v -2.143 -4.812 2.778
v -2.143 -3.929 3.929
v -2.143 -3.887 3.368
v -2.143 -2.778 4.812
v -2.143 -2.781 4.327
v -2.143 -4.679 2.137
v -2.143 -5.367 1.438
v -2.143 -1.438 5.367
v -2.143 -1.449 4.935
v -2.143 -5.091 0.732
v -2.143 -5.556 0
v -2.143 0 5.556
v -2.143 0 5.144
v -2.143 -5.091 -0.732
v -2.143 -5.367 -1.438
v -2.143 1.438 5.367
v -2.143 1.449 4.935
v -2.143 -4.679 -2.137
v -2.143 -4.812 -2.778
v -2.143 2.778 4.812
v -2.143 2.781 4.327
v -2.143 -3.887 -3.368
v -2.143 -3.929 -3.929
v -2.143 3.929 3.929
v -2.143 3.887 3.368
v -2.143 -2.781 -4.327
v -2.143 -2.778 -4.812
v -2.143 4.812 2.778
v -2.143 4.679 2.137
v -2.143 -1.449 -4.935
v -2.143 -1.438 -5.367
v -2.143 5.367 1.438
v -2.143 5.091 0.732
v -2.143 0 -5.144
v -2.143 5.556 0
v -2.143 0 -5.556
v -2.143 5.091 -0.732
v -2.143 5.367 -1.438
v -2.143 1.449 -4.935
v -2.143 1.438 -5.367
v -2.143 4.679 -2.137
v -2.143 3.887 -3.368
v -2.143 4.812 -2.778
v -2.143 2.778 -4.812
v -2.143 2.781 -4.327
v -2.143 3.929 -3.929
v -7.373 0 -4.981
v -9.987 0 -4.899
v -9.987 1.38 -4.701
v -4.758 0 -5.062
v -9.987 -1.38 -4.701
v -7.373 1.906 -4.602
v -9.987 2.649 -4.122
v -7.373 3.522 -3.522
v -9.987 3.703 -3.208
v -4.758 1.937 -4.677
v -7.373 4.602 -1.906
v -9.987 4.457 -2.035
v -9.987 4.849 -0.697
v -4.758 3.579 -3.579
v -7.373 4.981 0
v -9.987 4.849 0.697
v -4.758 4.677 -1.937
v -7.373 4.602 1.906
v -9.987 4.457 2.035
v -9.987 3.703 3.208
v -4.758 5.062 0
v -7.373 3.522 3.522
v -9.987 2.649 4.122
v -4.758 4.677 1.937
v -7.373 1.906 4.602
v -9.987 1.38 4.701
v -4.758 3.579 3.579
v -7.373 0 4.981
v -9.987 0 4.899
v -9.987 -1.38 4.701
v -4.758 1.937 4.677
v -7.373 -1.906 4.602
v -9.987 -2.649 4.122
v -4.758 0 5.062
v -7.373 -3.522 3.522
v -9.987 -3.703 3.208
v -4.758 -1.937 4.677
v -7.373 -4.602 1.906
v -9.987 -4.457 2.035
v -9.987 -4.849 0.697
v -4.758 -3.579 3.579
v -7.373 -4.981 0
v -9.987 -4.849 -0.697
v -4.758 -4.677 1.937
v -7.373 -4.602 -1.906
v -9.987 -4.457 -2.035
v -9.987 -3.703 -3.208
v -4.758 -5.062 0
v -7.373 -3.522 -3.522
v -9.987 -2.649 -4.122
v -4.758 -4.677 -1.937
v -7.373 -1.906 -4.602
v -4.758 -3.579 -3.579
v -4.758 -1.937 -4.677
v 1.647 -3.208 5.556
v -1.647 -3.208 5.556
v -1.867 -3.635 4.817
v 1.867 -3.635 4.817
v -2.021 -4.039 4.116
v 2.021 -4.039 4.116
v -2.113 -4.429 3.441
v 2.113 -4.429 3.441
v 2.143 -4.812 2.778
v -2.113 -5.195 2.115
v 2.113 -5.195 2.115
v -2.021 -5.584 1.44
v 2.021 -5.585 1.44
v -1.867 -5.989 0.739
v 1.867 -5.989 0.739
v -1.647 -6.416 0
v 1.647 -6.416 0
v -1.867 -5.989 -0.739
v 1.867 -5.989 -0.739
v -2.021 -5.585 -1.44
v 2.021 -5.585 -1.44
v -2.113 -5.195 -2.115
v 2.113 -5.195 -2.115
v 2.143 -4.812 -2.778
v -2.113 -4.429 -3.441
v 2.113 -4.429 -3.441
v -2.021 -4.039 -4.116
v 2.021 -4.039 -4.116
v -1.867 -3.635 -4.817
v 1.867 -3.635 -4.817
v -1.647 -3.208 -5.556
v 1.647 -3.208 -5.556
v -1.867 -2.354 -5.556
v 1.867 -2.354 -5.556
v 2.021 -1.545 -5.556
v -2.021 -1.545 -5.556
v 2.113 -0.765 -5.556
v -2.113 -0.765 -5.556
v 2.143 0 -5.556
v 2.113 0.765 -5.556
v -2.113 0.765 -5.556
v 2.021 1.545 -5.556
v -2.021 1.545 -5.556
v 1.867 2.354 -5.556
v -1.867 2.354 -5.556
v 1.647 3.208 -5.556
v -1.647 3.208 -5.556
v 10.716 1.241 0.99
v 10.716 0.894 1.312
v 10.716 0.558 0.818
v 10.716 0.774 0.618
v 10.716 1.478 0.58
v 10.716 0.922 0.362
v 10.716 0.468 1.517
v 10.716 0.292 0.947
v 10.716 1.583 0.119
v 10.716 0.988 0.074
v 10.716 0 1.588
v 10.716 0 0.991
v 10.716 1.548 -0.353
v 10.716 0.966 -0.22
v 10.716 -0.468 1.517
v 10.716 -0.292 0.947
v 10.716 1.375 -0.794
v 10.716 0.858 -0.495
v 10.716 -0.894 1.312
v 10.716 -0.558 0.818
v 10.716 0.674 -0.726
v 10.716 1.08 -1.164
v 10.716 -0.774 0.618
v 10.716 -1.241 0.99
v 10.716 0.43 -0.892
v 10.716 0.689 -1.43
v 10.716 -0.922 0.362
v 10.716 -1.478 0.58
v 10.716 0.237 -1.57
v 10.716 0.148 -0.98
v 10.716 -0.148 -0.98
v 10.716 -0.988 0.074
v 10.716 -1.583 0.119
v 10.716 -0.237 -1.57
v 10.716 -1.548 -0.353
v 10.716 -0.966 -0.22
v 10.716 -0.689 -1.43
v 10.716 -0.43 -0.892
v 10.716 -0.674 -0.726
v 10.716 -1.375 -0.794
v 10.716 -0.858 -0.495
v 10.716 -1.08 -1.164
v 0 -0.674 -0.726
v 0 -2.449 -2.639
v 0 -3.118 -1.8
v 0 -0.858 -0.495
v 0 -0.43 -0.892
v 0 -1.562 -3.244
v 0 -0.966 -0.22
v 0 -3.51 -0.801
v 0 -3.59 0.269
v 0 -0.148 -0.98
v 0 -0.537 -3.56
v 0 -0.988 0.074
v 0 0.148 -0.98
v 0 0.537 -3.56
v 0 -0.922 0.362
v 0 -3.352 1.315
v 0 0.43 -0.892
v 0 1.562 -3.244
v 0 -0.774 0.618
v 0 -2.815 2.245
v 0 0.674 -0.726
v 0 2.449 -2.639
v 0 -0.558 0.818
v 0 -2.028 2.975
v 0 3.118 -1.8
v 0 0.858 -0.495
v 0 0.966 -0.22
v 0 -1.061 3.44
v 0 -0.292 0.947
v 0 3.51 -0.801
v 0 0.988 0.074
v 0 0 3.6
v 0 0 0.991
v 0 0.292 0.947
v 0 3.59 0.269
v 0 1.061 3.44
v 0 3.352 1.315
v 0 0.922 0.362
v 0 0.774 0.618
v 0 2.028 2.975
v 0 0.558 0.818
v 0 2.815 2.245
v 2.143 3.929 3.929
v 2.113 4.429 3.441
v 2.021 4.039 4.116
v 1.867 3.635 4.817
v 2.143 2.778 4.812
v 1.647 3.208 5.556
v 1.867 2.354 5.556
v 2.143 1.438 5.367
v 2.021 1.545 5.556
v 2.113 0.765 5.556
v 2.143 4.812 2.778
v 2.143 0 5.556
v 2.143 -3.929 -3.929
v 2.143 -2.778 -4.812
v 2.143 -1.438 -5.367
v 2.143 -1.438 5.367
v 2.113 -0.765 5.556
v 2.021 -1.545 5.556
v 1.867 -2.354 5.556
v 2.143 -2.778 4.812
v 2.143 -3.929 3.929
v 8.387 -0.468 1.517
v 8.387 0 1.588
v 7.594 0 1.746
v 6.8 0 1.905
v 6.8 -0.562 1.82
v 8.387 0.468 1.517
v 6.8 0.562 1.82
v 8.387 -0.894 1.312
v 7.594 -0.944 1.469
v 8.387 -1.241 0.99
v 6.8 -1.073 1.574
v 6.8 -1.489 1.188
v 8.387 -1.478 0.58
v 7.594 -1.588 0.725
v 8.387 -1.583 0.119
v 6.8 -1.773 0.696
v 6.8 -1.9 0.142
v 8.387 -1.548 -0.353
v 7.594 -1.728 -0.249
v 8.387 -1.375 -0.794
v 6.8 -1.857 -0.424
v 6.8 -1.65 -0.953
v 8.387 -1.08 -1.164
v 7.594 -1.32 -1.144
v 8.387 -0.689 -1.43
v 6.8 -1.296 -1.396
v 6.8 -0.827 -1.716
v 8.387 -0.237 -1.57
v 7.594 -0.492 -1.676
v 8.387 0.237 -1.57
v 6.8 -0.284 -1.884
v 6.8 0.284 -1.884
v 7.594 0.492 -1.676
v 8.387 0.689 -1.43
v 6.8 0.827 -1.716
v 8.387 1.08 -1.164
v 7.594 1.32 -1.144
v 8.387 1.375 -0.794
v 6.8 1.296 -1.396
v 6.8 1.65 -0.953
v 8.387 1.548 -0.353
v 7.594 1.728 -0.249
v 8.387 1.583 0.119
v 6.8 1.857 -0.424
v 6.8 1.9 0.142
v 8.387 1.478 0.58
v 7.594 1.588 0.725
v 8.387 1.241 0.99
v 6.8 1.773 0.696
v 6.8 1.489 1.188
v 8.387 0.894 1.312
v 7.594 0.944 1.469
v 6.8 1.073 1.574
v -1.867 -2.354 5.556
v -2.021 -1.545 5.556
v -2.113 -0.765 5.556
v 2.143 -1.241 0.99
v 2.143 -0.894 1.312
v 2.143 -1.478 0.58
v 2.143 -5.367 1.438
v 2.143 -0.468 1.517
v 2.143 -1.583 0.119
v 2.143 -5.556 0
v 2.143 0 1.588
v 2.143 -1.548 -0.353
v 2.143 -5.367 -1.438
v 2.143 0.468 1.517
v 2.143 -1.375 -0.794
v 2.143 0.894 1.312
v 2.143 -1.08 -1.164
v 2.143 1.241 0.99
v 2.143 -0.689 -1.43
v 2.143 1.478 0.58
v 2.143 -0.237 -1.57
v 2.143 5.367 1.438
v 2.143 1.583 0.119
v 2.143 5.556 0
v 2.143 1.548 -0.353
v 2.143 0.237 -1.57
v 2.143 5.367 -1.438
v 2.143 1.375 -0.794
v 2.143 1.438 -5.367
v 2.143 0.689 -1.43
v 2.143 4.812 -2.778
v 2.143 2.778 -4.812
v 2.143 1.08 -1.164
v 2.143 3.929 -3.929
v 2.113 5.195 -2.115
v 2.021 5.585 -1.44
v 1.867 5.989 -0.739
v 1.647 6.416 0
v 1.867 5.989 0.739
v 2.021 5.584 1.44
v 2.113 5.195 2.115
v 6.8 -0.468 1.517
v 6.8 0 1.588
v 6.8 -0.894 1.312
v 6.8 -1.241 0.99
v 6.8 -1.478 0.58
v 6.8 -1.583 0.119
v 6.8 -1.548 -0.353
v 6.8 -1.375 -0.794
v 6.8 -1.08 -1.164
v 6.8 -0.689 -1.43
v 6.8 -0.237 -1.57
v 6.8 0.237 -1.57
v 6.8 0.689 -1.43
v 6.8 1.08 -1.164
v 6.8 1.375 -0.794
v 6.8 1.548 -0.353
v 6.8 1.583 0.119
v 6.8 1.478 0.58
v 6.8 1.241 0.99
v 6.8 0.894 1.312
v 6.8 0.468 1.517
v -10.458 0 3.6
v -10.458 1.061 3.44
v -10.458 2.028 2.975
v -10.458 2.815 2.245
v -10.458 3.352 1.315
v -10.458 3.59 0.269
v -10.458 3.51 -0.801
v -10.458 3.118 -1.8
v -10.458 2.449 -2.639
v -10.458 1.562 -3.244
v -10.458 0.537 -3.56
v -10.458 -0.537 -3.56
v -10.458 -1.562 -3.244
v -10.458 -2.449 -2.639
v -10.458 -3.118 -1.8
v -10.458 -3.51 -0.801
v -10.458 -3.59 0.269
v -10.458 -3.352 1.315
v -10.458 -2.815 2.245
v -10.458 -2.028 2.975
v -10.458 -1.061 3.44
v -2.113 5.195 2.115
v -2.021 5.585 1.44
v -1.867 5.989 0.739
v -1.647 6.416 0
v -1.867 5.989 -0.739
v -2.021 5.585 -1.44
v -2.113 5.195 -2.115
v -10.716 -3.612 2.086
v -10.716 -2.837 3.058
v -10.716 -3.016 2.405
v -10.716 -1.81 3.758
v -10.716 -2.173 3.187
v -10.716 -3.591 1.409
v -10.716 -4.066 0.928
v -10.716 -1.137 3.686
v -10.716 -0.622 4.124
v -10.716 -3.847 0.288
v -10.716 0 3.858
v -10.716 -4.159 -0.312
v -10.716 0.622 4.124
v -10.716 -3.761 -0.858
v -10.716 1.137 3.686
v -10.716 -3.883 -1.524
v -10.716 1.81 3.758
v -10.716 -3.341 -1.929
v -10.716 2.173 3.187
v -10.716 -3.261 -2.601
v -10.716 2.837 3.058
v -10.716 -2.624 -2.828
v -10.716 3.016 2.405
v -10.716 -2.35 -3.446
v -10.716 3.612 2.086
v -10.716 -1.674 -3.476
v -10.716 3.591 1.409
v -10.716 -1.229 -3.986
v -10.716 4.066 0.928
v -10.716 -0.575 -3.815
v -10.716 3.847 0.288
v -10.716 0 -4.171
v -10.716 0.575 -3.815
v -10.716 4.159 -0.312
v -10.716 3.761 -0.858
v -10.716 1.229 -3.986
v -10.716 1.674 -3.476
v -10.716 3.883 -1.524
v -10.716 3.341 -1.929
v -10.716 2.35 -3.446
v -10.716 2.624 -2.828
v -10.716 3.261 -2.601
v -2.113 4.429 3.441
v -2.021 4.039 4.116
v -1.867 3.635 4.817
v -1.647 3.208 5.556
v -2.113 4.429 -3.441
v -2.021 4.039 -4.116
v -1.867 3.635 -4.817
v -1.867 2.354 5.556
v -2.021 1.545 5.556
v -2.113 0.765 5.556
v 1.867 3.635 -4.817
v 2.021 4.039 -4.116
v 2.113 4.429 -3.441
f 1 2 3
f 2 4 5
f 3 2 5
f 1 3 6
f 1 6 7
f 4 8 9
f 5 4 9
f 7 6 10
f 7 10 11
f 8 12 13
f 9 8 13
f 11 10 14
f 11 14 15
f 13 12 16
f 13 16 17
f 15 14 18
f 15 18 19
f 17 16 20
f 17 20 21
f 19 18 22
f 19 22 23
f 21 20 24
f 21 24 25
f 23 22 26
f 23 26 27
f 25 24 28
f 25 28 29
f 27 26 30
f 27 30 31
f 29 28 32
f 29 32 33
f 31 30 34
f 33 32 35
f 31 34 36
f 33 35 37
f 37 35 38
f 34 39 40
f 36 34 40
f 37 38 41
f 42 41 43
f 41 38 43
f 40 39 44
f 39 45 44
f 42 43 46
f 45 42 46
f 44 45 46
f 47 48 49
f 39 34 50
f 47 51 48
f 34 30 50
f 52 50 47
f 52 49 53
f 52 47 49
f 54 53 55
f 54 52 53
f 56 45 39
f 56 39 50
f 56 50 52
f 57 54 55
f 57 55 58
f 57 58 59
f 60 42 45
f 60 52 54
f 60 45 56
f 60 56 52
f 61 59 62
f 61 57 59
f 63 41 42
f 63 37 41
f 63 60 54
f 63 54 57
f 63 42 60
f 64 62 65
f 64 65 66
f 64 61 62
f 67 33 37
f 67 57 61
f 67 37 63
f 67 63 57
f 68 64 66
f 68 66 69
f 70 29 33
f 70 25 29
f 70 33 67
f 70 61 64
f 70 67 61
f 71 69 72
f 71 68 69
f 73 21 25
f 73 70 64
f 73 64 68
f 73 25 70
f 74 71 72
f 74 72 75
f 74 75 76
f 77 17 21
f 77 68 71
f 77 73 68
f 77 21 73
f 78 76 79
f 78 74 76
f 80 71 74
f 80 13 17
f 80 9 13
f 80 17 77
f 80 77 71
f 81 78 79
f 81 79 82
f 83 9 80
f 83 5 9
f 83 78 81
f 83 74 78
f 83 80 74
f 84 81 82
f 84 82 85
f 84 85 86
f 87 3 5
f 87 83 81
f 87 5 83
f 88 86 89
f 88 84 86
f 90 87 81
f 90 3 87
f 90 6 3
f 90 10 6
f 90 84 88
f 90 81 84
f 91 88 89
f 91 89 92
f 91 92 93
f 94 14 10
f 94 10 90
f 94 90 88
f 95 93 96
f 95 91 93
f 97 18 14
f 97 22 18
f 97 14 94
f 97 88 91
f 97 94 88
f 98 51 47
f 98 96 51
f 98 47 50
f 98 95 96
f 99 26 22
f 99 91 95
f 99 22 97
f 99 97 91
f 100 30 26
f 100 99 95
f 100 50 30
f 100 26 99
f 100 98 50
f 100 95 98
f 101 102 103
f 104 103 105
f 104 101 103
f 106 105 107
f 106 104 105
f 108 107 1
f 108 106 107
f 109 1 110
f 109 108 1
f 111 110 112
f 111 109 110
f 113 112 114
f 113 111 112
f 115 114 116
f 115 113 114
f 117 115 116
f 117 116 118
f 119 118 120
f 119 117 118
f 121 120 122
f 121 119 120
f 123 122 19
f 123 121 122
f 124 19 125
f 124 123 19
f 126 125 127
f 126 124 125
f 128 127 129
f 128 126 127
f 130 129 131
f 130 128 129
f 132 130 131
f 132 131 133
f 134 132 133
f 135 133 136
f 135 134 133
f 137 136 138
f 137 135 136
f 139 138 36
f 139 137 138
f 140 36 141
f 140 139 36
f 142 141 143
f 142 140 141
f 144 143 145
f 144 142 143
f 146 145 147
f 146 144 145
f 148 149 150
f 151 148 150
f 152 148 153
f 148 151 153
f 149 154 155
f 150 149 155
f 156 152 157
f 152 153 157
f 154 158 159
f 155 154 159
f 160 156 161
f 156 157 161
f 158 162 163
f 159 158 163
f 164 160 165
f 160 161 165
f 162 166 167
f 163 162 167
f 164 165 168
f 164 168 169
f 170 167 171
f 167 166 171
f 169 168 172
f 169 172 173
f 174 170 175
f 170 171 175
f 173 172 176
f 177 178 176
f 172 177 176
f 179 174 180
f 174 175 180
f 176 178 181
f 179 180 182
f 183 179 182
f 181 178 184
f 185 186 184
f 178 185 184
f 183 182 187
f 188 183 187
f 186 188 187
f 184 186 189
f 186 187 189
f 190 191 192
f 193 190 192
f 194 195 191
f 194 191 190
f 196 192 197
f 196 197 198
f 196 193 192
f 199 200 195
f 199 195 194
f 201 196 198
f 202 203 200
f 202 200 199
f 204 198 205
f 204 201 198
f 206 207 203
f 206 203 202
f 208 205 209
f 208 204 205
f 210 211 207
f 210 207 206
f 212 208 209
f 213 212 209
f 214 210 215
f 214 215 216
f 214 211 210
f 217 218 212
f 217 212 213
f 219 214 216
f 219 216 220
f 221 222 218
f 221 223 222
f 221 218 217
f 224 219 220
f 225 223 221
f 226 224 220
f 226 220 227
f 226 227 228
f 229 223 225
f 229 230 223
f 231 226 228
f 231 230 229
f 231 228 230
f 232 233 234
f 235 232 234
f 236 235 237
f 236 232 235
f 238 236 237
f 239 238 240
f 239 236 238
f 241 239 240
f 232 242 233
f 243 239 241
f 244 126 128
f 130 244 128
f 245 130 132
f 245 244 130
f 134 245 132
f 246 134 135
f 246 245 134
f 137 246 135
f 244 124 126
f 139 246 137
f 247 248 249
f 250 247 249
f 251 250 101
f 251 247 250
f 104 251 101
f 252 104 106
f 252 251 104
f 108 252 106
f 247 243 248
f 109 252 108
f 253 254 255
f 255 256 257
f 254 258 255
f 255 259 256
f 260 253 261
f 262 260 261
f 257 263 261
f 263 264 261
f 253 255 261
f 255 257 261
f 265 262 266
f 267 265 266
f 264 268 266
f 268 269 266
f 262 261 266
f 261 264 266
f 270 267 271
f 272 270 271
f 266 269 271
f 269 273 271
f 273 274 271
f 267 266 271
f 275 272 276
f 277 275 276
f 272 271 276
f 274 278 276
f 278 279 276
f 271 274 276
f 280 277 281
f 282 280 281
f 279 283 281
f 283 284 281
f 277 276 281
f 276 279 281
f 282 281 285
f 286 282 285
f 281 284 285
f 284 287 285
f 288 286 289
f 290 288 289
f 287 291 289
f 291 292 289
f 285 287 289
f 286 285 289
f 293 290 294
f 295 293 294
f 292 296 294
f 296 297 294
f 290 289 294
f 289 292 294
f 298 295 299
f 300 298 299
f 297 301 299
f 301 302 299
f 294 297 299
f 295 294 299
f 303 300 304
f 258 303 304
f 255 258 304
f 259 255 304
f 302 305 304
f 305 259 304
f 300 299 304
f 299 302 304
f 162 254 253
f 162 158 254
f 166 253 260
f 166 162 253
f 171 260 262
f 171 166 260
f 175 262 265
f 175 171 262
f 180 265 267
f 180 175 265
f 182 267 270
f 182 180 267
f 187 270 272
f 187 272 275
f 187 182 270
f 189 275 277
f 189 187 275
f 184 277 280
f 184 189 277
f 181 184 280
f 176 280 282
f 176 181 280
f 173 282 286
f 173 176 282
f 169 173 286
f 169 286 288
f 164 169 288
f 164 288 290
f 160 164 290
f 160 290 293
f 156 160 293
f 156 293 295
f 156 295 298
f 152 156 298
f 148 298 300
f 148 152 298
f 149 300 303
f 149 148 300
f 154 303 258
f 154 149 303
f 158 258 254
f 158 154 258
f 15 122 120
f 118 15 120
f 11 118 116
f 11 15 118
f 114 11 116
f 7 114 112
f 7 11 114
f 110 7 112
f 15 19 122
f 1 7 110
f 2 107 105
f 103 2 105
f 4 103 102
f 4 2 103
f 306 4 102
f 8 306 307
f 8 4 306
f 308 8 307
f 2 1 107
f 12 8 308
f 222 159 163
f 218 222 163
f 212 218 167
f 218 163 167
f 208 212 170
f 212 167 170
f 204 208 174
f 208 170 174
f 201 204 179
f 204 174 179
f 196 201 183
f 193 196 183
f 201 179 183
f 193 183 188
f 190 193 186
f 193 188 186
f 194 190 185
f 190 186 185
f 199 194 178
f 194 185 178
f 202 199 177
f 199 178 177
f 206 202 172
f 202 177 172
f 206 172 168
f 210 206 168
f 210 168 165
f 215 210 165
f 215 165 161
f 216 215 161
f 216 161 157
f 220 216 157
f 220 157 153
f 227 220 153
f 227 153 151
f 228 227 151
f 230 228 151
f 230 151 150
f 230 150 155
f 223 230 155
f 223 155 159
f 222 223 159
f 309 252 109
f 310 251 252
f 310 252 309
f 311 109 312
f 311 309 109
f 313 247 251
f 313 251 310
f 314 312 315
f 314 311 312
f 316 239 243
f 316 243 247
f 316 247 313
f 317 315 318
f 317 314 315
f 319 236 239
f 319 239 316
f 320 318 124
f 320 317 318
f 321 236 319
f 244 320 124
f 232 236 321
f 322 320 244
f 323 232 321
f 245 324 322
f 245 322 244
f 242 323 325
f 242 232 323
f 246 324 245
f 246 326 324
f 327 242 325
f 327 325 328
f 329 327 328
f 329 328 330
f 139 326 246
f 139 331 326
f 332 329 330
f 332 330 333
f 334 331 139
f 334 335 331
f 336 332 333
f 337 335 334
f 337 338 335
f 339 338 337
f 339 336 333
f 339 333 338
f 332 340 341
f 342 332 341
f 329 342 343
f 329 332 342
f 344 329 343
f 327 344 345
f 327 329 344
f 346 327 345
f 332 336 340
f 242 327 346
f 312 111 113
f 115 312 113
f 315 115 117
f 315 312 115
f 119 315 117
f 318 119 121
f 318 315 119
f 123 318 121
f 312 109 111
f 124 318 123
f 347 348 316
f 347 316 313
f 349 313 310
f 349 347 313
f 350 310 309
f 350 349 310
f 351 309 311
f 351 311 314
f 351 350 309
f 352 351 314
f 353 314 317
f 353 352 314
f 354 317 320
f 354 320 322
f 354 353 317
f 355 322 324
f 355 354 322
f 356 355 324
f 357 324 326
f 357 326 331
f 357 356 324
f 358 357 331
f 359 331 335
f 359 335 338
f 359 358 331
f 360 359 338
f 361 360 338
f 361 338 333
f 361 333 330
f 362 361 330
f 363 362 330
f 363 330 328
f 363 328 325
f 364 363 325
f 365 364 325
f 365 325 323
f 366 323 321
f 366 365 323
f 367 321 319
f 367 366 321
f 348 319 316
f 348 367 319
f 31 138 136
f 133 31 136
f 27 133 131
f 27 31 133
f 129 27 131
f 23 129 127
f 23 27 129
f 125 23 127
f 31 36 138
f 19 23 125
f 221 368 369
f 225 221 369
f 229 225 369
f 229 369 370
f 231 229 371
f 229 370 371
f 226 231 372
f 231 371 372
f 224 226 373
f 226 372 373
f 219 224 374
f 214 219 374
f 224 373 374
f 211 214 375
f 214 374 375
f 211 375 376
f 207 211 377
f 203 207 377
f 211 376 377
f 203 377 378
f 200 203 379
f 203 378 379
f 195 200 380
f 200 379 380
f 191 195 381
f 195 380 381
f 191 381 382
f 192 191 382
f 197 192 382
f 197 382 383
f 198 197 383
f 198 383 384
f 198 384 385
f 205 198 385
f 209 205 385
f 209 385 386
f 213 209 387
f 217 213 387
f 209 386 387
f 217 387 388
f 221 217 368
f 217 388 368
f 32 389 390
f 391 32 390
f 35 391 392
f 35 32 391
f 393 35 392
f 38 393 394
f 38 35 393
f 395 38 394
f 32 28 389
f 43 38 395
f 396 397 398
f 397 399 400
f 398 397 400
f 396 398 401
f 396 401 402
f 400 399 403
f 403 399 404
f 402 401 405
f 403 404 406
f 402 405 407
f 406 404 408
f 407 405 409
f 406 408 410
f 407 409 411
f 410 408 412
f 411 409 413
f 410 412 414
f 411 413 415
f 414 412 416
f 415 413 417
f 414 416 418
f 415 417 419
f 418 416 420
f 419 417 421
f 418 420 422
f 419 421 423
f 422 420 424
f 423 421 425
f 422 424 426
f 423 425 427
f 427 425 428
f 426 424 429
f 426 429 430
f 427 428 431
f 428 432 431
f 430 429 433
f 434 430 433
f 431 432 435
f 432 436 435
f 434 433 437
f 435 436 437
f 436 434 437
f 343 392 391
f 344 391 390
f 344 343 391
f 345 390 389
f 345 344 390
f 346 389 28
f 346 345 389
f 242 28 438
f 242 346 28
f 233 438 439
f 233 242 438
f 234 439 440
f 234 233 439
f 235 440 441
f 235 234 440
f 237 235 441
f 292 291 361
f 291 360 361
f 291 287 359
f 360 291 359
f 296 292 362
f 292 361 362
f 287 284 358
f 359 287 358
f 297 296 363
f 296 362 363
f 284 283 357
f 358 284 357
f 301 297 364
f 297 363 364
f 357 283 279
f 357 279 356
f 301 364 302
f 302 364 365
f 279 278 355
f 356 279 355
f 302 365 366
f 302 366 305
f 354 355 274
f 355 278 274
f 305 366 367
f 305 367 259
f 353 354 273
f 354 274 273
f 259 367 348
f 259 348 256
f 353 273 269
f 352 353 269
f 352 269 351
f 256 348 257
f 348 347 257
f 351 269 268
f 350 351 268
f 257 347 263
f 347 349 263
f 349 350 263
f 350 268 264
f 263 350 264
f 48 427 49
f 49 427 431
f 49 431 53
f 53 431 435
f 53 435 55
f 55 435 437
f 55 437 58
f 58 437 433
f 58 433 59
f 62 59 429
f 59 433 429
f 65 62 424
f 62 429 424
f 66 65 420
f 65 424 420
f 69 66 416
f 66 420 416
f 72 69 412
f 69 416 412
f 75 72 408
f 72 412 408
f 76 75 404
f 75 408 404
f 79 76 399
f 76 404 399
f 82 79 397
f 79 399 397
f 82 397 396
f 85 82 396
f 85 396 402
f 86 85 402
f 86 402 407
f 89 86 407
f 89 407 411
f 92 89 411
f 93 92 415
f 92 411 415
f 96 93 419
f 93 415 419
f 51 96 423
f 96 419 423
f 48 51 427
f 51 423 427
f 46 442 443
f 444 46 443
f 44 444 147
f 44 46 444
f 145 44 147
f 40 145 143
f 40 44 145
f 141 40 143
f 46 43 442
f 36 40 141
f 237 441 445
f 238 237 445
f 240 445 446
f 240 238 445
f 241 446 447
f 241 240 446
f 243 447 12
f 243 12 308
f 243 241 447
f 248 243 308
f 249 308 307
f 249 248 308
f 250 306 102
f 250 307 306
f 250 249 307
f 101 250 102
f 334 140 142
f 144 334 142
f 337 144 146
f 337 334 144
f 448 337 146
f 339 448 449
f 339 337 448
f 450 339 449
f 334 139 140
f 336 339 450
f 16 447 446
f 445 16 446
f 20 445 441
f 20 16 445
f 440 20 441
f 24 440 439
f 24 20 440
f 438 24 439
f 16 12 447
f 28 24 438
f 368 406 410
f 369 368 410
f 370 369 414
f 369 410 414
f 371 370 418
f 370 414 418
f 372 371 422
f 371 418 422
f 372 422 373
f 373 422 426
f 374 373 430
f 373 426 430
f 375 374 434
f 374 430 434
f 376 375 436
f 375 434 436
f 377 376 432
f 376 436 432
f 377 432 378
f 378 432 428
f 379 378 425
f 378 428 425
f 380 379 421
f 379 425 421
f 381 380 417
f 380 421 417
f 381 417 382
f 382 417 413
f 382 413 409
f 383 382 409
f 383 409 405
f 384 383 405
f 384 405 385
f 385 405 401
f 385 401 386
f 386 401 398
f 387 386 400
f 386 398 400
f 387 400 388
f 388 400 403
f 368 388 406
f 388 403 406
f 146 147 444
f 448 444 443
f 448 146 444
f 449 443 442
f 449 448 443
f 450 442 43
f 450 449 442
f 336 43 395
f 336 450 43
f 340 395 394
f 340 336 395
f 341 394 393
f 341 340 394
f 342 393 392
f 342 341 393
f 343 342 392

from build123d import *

# Parameters (mm, degrees)
HEX_START               = 10.715625
HEX_HT_DEPTH            = 2.143125
SKETCH2_R               = 5.1435
EXTRUDE_L4_DEPTH        = 8.5725
EXTRUDE_L4_DRAFT        = -1.783333333
SKETCH9_W               = 12.85875
SKETCH9_H               = 0.5969
SKETCH11_OUTSIDE_W      = 75.416
SKETCH11_OUTSIDE_H      = 77.136
SKETCH11_OUTSIDE_R      = 5.55625
CUT_EXTRUDE3_DEPTH      = 16.407203436
CUT_EXTRUDE3_DRAFT      = -60
SKETCH12_OUTSIDE_W      = 75.416
SKETCH12_OUTSIDE_H      = 77.136
SKETCH12_OUTSIDE_R      = 5.55625
CUT_EXTRUDE5_DEPTH      = 16.407203436
CUT_EXTRUDE5_DRAFT      = -60
SKETCH14_R              = 0.9906
CUT_EXTRUDE6_DEPTH      = 16.407203436
CUT_EXTRUDE6_DEPTH_BACK = 16.407203436
SKETCH19_R              = 3.60045
CUT_EXTRUDE7_DEPTH      = 10.715625
CHAMFER1_SIZE           = 0.257175


with BuildPart() as part:
    # Sketch8 → Hex ht (new, symmetric)
    with BuildSketch(Plane(origin=(-10.715625, 0, 0), x_dir=(0, 0, -1), z_dir=(1, 0, 0)).offset(HEX_START)):
        Polygon((0, 6.415804866), (-5.55625, 3.207902433), (-5.55625, -3.207902433), (0, -6.415804866), (5.55625, -3.207902433), (5.55625, 3.207902433), align=None)
    extrude(amount=HEX_HT_DEPTH, both=True)


with BuildPart() as body_2:
    # Sketch2 → Extrude L4 (with draft: the straight prism first)
    with BuildSketch(Plane(origin=(-2.143125, 0, 0), x_dir=(0, 0, -1), z_dir=(1, 0, 0))):
        Circle(SKETCH2_R)
    extrude(amount=-EXTRUDE_L4_DEPTH)
    # Extrude L4: the draft: its side faces are tilted about the plane it starts from
    extrude_l4_sides = [body_2.faces().sort_by_distance(p)[0] for p in [
        (-6.429375, 0, 5.1435),
    ]]
    draft(extrude_l4_sides, Plane(origin=(-2.143125, 0, 0), x_dir=(0, 0, -1), z_dir=(1, 0, 0)), EXTRUDE_L4_DRAFT)

    # Sketch6 → Cut-Revolve1 (revolve, cut)
    with BuildSketch(Plane.XY, mode=Mode.PRIVATE) as cut_revolve1_sk:
        Polygon((-9.987395966, -4.899267892), (-10.715625, -4.171038858), (-10.715625, -4.876594414), align=None)
    revolve(cut_revolve1_sk.sketch.rotate(Axis((-10.715625, 0, 0), (1, 0, 0)), 90), axis=Axis((-10.715625, 0, 0), (1, 0, 0)), mode=Mode.SUBTRACT)

    # Combine2: union part
    add(part.part)

    # Sketch9 → Revolve1 (revolve)
    with BuildSketch(Plane.XY, mode=Mode.PRIVATE) as revolve1_sk:
        with Locations((4.28625, 1.28905)):
            Rectangle(SKETCH9_W, SKETCH9_H)
    revolve(revolve1_sk.sketch.rotate(Axis((0, 0, 0), (1, 0, 0)), 90), axis=Axis((0, 0, 0), (1, 0, 0)))

    # Sketch13 → Revolve2 (revolve)
    with BuildSketch(Plane.XY, mode=Mode.PRIVATE) as revolve2_sk:
        Polygon((8.387291667, 1.5875), (6.799791667, 1.905), (6.799791667, 1.5875), align=None)
    revolve(revolve2_sk.sketch.rotate(Axis((-10.715625, 0, 0), (1, 0, 0)), 90), axis=Axis((-10.715625, 0, 0), (1, 0, 0)))

    # Sketch17 → Revolve3 (revolve)
    with BuildSketch(Plane.XY, mode=Mode.PRIVATE) as revolve3_sk:
        Polygon((-2.143125, 1.905), (-1.593198869, 1.5875), (-2.143125, 1.5875), align=None)
    revolve(revolve3_sk.sketch.rotate(Axis((-10.715625, 0, 0), (1, 0, 0)), 270), axis=Axis((-10.715625, 0, 0), (1, 0, 0)))


with BuildPart() as cut_extrude3_tool:
    # Sketch11 outside → Cut-Extrude3 (with draft: the straight prism first)
    with BuildSketch(Plane(origin=(2.143125, 0, 0), x_dir=(0, 0, -1), z_dir=(1, 0, 0))):
        Rectangle(SKETCH11_OUTSIDE_W, SKETCH11_OUTSIDE_H)
        Circle(SKETCH11_OUTSIDE_R, mode=Mode.SUBTRACT)
    extrude(amount=-CUT_EXTRUDE3_DEPTH)
    # Cut-Extrude3: the draft: its side faces are tilted about the plane it starts from
    cut_extrude3_sides = [cut_extrude3_tool.faces().sort_by_distance(p)[0] for p in [
        (-6.060476718, -38.568, 0),
        (-6.060476718, 0, -37.708),
        (-6.060476718, 38.568, 0),
        (-6.060476718, 0, 37.708),
        (-6.060476718, 0, 5.55625),
    ]]
    draft(cut_extrude3_sides, Plane(origin=(2.143125, 0, 0), x_dir=(0, 0, -1), z_dir=(1, 0, 0)), CUT_EXTRUDE3_DRAFT)


with BuildPart() as body_2_1:
    add(body_2.part)

    # Cut-Extrude3: cut by cut_extrude3_tool
    add(cut_extrude3_tool.part, mode=Mode.SUBTRACT)


with BuildPart() as cut_extrude5_tool:
    # Sketch12 outside → Cut-Extrude5 (with draft: the straight prism first)
    with BuildSketch(Plane.ZY.offset(2.143125)):
        Rectangle(SKETCH12_OUTSIDE_W, SKETCH12_OUTSIDE_H)
        Circle(SKETCH12_OUTSIDE_R, mode=Mode.SUBTRACT)
    extrude(amount=-CUT_EXTRUDE5_DEPTH)
    # Cut-Extrude5: the draft: its side faces are tilted about the plane it starts from
    cut_extrude5_sides = [cut_extrude5_tool.faces().sort_by_distance(p)[0] for p in [
        (6.060476718, -38.568, 0),
        (6.060476718, 0, 37.708),
        (6.060476718, 38.568, 0),
        (6.060476718, 0, -37.708),
        (6.060476718, 0, -5.55625),
    ]]
    draft(cut_extrude5_sides, Plane.ZY.offset(2.143125), CUT_EXTRUDE5_DRAFT)


with BuildPart() as body_2_2:
    add(body_2_1.part)

    # Cut-Extrude5: cut by cut_extrude5_tool
    add(cut_extrude5_tool.part, mode=Mode.SUBTRACT)

    # Sketch14 → Cut-Extrude6 (cut, two sides)
    with BuildSketch(Plane.ZY.offset(2.143125)) as cut_extrude6_sk:
        Circle(SKETCH14_R)
    extrude(amount=CUT_EXTRUDE6_DEPTH, mode=Mode.SUBTRACT)
    extrude(cut_extrude6_sk.sketch, amount=-CUT_EXTRUDE6_DEPTH_BACK, mode=Mode.SUBTRACT)

    # Sketch19 → Cut-Extrude7 (cut)
    with BuildSketch(Plane.ZY.offset(10.715625)):
        Circle(SKETCH19_R)
    extrude(amount=-CUT_EXTRUDE7_DEPTH, mode=Mode.SUBTRACT)

    # Chamfer1
    chamfer1_edges = [body_2_2.edges().sort_by_distance(p)[0] for p in [
        (-10.715625, 0, -3.60045),
    ]]
    chamfer(chamfer1_edges, length=CHAMFER1_SIZE)


solid = body_2_2.part
